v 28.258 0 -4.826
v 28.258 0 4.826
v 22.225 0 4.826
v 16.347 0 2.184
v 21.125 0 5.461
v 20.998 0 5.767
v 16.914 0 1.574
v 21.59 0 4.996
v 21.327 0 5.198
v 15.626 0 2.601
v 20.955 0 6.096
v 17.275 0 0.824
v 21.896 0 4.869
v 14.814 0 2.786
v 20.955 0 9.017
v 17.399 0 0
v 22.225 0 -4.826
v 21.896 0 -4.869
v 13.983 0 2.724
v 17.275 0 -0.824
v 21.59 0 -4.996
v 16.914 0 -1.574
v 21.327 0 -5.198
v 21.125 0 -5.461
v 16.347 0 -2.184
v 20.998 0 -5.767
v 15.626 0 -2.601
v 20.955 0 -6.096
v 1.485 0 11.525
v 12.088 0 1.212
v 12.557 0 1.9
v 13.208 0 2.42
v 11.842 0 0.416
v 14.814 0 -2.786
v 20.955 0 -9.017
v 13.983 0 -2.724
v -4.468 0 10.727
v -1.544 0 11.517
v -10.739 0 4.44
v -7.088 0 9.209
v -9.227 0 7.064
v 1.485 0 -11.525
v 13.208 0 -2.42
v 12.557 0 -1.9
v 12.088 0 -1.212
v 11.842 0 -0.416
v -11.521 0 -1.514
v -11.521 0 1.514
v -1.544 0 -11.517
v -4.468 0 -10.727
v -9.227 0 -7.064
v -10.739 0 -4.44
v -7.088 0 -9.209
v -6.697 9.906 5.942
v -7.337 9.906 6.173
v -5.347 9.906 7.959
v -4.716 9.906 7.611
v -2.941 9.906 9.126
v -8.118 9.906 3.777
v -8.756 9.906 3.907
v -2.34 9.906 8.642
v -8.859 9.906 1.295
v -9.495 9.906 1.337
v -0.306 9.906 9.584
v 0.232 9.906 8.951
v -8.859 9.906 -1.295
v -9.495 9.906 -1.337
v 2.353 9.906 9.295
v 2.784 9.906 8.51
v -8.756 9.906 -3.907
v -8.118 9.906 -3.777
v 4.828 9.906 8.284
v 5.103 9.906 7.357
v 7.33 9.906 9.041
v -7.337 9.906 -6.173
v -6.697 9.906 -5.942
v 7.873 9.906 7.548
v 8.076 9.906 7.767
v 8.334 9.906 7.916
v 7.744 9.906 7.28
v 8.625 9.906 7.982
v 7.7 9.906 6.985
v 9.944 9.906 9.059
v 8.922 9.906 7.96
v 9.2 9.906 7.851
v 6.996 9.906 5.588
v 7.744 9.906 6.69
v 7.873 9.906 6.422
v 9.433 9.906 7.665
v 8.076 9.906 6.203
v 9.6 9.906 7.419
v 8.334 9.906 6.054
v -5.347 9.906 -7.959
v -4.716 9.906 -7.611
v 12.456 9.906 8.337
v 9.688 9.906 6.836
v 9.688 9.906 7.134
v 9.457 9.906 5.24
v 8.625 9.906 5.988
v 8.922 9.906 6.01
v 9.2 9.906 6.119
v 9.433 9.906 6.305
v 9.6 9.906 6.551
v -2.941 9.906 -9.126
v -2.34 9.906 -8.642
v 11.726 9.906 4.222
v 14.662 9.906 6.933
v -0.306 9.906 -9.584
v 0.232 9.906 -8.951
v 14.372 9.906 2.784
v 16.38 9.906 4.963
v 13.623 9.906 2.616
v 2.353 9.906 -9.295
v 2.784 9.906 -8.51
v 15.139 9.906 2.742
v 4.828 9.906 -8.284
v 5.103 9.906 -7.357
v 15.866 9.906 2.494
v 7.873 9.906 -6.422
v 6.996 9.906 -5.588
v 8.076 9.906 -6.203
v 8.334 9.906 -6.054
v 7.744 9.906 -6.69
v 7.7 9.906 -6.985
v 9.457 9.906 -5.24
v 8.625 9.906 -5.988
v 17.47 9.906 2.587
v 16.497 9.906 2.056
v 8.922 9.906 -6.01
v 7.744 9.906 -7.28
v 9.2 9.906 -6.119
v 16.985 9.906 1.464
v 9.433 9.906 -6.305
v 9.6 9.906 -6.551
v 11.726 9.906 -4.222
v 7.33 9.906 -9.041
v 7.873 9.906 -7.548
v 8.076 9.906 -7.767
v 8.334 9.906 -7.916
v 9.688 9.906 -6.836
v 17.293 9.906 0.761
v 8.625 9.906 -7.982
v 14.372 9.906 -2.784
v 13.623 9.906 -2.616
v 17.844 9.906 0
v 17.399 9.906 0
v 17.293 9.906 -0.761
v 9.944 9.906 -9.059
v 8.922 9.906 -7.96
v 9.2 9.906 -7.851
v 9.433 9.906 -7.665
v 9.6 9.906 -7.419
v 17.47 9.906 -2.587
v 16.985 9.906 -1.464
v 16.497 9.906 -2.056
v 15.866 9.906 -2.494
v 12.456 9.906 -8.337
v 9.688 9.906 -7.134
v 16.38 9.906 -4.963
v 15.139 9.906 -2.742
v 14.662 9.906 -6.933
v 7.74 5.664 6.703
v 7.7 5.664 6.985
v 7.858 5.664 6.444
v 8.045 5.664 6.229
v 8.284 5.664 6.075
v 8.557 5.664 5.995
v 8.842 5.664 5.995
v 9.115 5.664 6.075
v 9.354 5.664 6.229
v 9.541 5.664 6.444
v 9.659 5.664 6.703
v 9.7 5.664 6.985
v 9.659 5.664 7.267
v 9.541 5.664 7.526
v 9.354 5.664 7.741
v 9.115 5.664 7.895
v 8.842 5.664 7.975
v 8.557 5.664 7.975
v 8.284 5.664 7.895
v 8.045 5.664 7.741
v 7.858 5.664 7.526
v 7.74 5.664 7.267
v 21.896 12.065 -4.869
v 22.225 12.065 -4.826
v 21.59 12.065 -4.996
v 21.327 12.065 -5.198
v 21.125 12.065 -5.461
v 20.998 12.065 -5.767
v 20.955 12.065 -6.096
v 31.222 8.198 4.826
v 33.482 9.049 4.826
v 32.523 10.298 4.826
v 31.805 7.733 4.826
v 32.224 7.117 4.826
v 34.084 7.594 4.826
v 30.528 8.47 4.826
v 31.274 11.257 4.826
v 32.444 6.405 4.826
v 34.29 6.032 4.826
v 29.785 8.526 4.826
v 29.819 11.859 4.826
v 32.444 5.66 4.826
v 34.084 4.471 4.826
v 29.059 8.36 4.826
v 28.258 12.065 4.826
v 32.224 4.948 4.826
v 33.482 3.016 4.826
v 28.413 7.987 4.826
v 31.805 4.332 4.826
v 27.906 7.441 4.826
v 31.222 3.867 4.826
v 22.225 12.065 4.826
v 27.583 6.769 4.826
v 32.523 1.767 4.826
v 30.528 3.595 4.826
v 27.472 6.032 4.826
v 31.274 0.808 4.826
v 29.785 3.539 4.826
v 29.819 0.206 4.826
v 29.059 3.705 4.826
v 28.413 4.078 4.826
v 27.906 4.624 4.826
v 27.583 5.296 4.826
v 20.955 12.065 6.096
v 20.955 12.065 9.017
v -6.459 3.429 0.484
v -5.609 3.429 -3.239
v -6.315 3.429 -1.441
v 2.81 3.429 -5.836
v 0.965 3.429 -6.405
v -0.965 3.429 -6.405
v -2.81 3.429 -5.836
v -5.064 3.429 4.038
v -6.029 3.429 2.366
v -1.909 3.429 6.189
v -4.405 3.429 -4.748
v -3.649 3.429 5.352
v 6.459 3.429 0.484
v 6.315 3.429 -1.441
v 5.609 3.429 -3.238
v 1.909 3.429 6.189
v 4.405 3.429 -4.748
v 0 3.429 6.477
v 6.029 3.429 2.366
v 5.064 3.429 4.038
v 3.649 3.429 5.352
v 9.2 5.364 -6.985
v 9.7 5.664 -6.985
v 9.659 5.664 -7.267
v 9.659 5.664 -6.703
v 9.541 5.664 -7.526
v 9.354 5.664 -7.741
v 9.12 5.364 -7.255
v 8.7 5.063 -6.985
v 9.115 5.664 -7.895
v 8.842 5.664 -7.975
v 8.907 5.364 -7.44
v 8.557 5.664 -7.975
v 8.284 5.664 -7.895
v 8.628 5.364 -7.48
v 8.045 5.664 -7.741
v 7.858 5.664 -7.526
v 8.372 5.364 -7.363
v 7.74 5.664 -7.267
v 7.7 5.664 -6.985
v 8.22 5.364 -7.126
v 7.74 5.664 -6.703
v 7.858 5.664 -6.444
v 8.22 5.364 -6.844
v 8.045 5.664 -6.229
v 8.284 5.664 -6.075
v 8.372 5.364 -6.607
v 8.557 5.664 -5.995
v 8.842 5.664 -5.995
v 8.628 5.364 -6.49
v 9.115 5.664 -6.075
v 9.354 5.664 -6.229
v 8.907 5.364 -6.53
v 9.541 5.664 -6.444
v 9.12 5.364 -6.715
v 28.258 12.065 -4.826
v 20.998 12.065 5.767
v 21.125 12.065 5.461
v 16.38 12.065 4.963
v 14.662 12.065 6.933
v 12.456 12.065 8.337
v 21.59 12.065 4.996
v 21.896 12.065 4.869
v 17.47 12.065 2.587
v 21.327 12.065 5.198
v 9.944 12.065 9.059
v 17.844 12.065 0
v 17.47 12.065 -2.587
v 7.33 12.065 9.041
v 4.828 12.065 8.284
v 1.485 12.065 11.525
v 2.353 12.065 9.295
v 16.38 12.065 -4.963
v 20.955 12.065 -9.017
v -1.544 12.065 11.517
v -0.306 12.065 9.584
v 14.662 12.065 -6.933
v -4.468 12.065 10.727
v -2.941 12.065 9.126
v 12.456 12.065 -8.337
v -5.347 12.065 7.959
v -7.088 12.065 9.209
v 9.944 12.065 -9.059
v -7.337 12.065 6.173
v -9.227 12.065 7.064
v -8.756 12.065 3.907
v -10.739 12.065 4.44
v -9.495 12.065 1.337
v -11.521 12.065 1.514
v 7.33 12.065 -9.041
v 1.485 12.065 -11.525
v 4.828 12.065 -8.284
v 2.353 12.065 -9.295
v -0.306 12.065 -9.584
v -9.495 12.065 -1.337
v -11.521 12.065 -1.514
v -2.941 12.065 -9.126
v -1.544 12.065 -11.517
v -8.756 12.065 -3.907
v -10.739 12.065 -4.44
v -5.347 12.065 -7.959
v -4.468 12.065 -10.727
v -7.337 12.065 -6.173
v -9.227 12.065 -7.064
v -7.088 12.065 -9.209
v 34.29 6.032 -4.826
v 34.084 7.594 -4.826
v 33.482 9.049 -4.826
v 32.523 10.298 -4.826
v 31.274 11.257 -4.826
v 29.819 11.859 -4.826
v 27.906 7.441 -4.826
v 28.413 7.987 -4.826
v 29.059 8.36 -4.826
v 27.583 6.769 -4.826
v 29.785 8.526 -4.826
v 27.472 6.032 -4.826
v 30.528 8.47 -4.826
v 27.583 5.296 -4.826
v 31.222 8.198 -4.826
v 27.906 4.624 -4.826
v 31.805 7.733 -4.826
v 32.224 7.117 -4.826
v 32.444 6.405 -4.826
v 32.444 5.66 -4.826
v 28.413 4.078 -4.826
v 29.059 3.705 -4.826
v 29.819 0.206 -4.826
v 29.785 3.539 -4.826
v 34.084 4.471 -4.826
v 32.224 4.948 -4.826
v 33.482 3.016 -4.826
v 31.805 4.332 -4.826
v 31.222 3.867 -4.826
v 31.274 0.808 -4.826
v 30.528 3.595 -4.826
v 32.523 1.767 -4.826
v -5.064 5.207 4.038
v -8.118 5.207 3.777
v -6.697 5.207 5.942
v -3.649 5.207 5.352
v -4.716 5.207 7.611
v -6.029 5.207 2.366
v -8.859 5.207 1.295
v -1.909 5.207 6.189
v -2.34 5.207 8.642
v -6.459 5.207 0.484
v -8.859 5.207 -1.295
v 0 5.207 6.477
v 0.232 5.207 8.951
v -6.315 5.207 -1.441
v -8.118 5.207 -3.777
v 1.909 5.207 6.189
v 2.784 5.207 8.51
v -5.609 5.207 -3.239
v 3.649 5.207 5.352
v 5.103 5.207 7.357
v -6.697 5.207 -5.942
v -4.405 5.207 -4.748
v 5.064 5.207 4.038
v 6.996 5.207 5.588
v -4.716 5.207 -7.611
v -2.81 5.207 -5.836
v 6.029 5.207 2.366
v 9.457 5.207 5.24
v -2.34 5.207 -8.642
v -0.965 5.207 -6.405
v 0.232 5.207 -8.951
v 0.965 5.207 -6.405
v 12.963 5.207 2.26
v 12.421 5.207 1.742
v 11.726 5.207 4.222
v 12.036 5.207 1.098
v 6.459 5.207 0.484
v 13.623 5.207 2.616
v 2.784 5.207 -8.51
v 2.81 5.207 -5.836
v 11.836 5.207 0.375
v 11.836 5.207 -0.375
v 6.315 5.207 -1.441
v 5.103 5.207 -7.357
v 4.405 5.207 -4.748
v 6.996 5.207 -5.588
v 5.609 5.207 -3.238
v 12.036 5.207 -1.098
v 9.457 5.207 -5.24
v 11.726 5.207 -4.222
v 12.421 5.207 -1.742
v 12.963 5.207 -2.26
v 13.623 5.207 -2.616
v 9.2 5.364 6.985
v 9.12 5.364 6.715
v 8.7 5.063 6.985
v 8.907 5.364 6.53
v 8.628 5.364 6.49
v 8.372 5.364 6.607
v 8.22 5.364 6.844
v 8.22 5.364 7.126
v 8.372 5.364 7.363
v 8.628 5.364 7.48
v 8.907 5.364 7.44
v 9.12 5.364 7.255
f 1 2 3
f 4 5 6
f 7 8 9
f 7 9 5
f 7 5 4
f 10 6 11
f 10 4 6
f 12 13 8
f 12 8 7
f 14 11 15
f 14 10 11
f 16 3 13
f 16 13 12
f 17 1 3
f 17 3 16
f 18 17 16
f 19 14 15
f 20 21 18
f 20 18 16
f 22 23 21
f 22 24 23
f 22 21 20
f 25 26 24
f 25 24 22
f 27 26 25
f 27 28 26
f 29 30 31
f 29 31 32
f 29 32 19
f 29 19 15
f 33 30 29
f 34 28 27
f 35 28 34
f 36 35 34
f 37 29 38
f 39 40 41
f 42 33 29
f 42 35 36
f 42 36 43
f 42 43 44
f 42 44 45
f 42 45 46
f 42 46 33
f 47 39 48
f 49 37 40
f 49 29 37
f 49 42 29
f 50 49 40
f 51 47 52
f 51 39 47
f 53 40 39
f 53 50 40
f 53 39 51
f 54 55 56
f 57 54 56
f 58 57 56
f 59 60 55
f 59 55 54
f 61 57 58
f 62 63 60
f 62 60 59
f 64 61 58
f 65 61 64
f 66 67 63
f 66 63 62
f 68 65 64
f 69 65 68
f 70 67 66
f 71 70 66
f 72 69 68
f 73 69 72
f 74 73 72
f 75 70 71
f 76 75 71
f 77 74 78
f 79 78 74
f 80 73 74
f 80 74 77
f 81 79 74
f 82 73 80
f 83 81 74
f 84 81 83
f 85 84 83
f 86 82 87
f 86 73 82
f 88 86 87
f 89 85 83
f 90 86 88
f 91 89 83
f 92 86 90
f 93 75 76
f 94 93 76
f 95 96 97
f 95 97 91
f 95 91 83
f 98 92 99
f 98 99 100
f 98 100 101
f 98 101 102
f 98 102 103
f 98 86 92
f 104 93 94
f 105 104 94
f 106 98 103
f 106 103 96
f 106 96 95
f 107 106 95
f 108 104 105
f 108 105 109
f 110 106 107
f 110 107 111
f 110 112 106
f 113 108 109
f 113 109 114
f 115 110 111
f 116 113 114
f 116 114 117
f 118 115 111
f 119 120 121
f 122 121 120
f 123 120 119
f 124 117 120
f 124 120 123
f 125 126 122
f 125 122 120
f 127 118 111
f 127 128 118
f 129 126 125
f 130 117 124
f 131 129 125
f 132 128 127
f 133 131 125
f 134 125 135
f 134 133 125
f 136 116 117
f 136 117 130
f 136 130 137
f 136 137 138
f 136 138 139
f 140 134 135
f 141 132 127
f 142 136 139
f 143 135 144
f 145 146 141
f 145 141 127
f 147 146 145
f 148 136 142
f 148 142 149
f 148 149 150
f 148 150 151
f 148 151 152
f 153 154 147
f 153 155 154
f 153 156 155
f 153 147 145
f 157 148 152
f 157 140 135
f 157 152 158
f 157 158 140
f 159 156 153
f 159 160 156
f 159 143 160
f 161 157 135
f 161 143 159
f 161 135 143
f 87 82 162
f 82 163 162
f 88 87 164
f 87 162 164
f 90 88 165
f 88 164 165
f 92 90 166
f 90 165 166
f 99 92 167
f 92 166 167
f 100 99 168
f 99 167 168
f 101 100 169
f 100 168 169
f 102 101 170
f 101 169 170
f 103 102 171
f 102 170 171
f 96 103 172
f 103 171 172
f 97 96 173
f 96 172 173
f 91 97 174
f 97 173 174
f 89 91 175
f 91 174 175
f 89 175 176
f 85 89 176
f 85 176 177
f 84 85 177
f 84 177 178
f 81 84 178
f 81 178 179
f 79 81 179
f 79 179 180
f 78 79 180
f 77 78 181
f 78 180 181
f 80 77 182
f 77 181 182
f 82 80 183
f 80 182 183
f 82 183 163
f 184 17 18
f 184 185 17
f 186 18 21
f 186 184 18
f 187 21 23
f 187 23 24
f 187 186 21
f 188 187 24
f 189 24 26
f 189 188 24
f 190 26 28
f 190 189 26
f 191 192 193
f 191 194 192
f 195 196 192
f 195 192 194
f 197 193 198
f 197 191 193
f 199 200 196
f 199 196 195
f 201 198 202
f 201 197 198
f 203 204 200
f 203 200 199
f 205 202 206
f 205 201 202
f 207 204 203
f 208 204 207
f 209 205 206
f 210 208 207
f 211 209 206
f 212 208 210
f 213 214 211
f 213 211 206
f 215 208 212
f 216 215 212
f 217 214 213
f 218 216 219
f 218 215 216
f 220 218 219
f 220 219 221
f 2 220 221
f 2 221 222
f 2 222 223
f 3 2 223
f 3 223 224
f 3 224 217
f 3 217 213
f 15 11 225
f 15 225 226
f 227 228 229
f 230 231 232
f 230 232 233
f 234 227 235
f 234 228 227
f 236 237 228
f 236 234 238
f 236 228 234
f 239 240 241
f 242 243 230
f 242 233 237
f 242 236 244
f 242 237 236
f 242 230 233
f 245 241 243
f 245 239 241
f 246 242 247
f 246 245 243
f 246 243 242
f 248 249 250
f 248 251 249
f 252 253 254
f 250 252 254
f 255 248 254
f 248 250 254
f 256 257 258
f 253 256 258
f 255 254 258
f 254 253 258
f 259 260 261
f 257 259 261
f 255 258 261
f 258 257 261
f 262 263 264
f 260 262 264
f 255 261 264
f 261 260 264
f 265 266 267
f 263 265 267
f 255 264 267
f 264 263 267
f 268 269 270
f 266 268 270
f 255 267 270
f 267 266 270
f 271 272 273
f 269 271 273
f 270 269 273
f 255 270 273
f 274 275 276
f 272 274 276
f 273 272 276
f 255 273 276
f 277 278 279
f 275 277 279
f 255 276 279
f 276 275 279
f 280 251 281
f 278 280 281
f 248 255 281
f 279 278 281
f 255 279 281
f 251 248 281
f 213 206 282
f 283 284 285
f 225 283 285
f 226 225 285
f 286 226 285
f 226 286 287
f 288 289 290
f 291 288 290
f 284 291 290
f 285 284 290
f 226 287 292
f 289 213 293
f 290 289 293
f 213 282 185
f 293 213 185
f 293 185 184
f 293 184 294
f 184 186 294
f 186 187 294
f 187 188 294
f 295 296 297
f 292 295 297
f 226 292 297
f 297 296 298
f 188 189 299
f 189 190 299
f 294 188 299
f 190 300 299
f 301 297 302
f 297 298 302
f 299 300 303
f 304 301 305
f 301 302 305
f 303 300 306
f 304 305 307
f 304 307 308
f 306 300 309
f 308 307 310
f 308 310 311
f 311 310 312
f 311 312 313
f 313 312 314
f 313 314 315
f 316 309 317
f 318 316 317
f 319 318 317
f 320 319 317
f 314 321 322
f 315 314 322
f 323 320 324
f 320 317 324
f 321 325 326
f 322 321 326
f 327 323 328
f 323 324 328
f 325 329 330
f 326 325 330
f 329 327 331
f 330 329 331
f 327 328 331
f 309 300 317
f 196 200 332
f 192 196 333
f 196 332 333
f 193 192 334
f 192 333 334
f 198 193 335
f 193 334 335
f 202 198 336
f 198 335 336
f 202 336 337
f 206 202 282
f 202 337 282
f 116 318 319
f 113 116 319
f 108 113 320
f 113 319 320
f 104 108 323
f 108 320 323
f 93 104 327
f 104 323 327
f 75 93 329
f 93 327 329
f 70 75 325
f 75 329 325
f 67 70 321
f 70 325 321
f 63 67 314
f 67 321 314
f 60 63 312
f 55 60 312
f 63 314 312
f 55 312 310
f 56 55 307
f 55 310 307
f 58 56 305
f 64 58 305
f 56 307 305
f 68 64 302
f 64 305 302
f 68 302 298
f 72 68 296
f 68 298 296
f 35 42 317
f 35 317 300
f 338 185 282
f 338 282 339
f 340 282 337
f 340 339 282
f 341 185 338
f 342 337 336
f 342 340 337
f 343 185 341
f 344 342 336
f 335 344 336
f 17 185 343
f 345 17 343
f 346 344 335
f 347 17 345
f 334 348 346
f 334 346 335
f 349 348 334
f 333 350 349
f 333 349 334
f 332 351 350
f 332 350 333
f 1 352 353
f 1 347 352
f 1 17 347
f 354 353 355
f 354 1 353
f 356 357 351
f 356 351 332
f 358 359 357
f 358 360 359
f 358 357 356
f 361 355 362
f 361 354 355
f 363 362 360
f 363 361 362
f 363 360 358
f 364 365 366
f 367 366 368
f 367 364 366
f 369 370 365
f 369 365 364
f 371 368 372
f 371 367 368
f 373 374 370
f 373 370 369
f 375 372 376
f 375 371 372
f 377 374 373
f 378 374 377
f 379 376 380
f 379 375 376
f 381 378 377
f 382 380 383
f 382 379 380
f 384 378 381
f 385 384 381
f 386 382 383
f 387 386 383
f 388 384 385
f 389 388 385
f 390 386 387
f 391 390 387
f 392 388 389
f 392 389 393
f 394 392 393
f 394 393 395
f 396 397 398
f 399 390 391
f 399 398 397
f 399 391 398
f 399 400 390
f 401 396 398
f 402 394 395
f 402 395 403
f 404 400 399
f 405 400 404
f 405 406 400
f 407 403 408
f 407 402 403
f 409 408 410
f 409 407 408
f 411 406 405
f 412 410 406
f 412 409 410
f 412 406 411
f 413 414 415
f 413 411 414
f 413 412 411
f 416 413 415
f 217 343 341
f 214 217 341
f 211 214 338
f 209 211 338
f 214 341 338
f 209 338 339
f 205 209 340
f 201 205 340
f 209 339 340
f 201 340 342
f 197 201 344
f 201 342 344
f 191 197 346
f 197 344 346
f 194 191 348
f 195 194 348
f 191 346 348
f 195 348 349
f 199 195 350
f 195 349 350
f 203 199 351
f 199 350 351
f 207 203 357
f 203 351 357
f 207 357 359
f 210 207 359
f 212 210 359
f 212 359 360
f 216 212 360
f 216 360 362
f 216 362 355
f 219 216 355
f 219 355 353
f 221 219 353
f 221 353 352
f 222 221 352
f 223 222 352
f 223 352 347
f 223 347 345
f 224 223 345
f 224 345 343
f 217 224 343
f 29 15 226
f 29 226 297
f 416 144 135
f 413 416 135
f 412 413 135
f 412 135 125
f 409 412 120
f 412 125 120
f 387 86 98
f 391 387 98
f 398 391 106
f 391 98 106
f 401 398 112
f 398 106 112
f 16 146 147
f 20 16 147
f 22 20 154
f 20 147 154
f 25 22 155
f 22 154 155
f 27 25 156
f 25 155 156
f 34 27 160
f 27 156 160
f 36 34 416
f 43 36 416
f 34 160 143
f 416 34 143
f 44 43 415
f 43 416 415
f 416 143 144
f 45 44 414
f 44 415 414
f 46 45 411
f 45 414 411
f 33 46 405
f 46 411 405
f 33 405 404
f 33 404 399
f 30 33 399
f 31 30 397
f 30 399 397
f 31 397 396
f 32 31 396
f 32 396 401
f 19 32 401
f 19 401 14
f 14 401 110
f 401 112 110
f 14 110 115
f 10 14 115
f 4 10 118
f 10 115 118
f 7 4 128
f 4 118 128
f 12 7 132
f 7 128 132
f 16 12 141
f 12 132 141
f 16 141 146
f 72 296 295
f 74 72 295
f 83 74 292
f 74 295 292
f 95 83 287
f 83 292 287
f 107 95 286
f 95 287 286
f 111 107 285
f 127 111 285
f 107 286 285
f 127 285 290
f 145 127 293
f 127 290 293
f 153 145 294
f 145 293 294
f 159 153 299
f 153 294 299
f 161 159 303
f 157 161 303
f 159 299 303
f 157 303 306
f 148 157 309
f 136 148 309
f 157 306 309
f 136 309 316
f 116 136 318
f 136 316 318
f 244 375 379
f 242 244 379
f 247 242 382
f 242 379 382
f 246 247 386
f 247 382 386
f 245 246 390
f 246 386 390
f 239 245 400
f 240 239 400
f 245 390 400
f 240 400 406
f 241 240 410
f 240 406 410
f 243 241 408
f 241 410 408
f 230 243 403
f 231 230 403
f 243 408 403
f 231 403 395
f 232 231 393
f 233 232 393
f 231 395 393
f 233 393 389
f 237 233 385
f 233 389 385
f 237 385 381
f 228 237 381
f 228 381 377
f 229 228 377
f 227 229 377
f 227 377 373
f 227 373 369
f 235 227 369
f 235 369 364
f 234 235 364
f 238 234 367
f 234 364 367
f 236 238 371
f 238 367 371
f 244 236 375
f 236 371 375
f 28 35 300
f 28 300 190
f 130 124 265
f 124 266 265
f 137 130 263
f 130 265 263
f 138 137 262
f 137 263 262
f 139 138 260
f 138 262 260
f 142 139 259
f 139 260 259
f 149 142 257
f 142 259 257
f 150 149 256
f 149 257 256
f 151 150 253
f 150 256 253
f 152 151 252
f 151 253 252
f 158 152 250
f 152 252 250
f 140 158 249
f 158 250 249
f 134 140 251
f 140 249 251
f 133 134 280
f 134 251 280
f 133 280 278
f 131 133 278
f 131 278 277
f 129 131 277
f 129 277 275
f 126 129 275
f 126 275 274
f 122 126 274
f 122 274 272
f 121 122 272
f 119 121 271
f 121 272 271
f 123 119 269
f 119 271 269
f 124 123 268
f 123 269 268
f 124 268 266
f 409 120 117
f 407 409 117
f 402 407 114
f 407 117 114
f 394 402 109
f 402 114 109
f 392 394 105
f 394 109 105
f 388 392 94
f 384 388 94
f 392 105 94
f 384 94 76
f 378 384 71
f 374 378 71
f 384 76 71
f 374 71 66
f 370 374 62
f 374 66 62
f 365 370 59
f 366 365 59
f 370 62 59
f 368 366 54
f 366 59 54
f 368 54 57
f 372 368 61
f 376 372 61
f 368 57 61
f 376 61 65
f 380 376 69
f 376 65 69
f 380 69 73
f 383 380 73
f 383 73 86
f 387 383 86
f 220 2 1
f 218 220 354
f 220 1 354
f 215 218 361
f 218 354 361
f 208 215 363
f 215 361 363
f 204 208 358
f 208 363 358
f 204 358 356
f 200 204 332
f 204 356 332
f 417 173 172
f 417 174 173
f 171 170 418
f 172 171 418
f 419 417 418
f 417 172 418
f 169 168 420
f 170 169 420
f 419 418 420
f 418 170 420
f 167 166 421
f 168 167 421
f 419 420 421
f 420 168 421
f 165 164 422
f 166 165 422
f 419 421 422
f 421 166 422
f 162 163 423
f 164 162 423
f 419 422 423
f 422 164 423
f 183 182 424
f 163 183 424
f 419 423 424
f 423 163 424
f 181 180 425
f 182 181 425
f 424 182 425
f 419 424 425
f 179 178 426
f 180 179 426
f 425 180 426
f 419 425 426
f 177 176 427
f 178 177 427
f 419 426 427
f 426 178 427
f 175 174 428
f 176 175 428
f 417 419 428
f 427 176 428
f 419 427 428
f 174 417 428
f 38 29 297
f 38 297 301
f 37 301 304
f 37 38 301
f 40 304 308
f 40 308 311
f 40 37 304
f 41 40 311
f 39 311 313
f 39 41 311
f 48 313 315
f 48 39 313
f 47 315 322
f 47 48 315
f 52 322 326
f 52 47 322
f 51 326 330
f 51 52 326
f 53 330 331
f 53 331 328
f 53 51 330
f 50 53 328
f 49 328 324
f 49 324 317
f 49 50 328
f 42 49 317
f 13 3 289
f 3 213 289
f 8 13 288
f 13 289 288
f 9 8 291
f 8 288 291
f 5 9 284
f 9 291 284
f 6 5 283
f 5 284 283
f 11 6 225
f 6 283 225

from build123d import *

# Parameters (mm, degrees)
BOSS_EXTRUDE1_DEPTH        = 12.065
FILLET2_R                  = 1.27
FILLET3_R                  = 1.27
CUT_EXTRUDE1_REACH         = 41.898
F_5_0_5_DIAMETER_HOLE1_D   = 5
CUT_EXTRUDE2_DEPTH         = 2.159
CUT_EXTRUDE3_DEPTH         = 4.699
F_97_0_22_DIAMETER_HOLE1_D = 5.588
SKETCH12_R                 = 6.477
CUT_EXTRUDE4_DEPTH         = 1.778
M2X0_4_TAPPED_HOLE1_D      = 2
M2X0_4_TAPPED_HOLE1_DEPTH  = 4.2418
M2X0_4_TAPPED_HOLE1_TIP    = 0.600860619


with BuildPart() as part:
    # Sketch1 → Boss-Extrude1 (new body)
    with BuildSketch(Plane(origin=(0, 0, 0), x_dir=(1, 0, 0), z_dir=(0, 1, 0))):
        with BuildLine():
            Line((20.955, 9.017), (20.955, 4.826))
            Line((20.955, 4.826), (34.29, 4.826))
            Line((34.29, 4.826), (34.29, -4.826))
            Line((34.29, -4.826), (20.955, -4.826))
            Line((20.955, -4.826), (20.955, -9.017))
            Line((20.955, -9.017), (1.484742221, -11.525257515))
            ThreePointArc((1.484742221, -11.525257515), (-11.6205, 0), (1.484742221, 11.525257515))
            Line((1.484742221, 11.525257515), (20.955, 9.017))
        make_face()
    extrude(amount=BOSS_EXTRUDE1_DEPTH)

    # Fillet2
    fillet2_edges = [part.edges().sort_by_distance(p)[0] for p in [
        (20.955, 6.0325, 4.826),
    ]]
    fillet(fillet2_edges, radius=FILLET2_R)

    # Fillet3
    fillet3_edges = [part.edges().sort_by_distance(p)[0] for p in [
        (20.955, 6.0325, -4.826),
    ]]
    fillet(fillet3_edges, radius=FILLET3_R)

    # Sketch3 → Cut-Extrude1 (cut, up to next)
    with BuildSketch(Plane(origin=(0, 0, -4.826), x_dir=(-1, 0, 0), z_dir=(0, 0, -1)), mode=Mode.PRIVATE) as cut_extrude1_sk1:
        with BuildLine():
            ThreePointArc((-34.29, 6.0325), (-32.523121658, 10.298121658), (-28.2575, 12.065))
            Line((-28.2575, 12.065), (-34.29, 12.065))
            Line((-34.29, 12.065), (-34.29, 6.0325))
        make_face()
    cut_extrude1_tool1 = extrude(cut_extrude1_sk1.sketch, amount=-CUT_EXTRUDE1_REACH, mode=Mode.PRIVATE) & part.part
    # Sketch3 → Cut-Extrude1 (cut, up to next)
    with BuildSketch(Plane(origin=(0, 0, -4.826), x_dir=(-1, 0, 0), z_dir=(0, 0, -1)), mode=Mode.PRIVATE) as cut_extrude1_sk2:
        with BuildLine():
            ThreePointArc((-28.2575, 0), (-32.523121658, 1.766878342), (-34.29, 6.0325))
            Line((-34.29, 6.0325), (-34.29, 0))
            Line((-34.29, 0), (-28.2575, 0))
        make_face()
    cut_extrude1_tool2 = extrude(cut_extrude1_sk2.sketch, amount=-CUT_EXTRUDE1_REACH, mode=Mode.PRIVATE) & part.part
    add(cut_extrude1_tool1.solids().sort_by_distance((32.942533, 10.717533, -4.826))[0], mode=Mode.SUBTRACT)
    add(cut_extrude1_tool2.solids().sort_by_distance((32.942533, 1.347467, -4.826))[0], mode=Mode.SUBTRACT)

    # Ø5.0 (5) Diameter Hole1 (through all)
    with Locations(Plane.XY.offset(4.826)):
        with Locations((29.972, 6.0325)):
            Hole(F_5_0_5_DIAMETER_HOLE1_D / 2)

    # Sketch8 → Cut-Extrude2 (cut)
    with BuildSketch(Plane(origin=(0, 12.065, 0), x_dir=(1, 0, 0), z_dir=(0, 1, 0))):
        with BuildLine():
            ThreePointArc((4.828317518, 8.284122295), (-9.5885, 0), (4.828317518, -8.284122295))
            ThreePointArc((4.828317518, -8.284122295), (17.8435, 0), (4.828317518, 8.284122295))
        make_face()
    extrude(amount=-CUT_EXTRUDE2_DEPTH, mode=Mode.SUBTRACT)

    # Sketch9 → Cut-Extrude3 (cut)
    with BuildSketch(Plane(origin=(0, 9.906, 0), x_dir=(1, 0, 0), z_dir=(0, 1, 0))):
        with BuildLine():
            ThreePointArc((6.995671394, 5.588), (-8.9535, 0), (6.995671394, -5.588))
            ThreePointArc((6.995671394, -5.588), (11.975498152, -4.059363478), (15.24, 0))
            ThreePointArc((15.24, 0), (11.975498152, 4.059363478), (6.995671394, 5.588))
        make_face()
    extrude(amount=-CUT_EXTRUDE3_DEPTH, mode=Mode.SUBTRACT)

    # #97 (0.22) Diameter Hole1 (through all)
    with Locations(Plane(origin=(0, 0, 0), x_dir=(-1, 0, 0), z_dir=(0, -1, 0))):
        with Locations((-14.605, 0)):
            Hole(F_97_0_22_DIAMETER_HOLE1_D / 2)

    # Sketch12 → Cut-Extrude4 (cut)
    with BuildSketch(Plane(origin=(0, 5.207, 0), x_dir=(1, 0, 0), z_dir=(0, 1, 0))):
        with Locations(Location((0, 0, 0), (0, 0, 270))):
            Circle(SKETCH12_R)
    extrude(amount=-CUT_EXTRUDE4_DEPTH, mode=Mode.SUBTRACT)

    # M2x0.4 Tapped Hole1
    with Locations(Plane(origin=(0, 9.906, 0), x_dir=(1, 0, 0), z_dir=(0, 1, 0))):
        with Locations((8.6995, 6.985), (8.6995, -6.985)):
            Hole(M2X0_4_TAPPED_HOLE1_D / 2, depth=M2X0_4_TAPPED_HOLE1_DEPTH)
            with Locations((0, 0, -(M2X0_4_TAPPED_HOLE1_DEPTH + M2X0_4_TAPPED_HOLE1_TIP / 2))):  # 118° drill point
                Cone(0, M2X0_4_TAPPED_HOLE1_D / 2, M2X0_4_TAPPED_HOLE1_TIP, mode=Mode.SUBTRACT)


solid = part.part
